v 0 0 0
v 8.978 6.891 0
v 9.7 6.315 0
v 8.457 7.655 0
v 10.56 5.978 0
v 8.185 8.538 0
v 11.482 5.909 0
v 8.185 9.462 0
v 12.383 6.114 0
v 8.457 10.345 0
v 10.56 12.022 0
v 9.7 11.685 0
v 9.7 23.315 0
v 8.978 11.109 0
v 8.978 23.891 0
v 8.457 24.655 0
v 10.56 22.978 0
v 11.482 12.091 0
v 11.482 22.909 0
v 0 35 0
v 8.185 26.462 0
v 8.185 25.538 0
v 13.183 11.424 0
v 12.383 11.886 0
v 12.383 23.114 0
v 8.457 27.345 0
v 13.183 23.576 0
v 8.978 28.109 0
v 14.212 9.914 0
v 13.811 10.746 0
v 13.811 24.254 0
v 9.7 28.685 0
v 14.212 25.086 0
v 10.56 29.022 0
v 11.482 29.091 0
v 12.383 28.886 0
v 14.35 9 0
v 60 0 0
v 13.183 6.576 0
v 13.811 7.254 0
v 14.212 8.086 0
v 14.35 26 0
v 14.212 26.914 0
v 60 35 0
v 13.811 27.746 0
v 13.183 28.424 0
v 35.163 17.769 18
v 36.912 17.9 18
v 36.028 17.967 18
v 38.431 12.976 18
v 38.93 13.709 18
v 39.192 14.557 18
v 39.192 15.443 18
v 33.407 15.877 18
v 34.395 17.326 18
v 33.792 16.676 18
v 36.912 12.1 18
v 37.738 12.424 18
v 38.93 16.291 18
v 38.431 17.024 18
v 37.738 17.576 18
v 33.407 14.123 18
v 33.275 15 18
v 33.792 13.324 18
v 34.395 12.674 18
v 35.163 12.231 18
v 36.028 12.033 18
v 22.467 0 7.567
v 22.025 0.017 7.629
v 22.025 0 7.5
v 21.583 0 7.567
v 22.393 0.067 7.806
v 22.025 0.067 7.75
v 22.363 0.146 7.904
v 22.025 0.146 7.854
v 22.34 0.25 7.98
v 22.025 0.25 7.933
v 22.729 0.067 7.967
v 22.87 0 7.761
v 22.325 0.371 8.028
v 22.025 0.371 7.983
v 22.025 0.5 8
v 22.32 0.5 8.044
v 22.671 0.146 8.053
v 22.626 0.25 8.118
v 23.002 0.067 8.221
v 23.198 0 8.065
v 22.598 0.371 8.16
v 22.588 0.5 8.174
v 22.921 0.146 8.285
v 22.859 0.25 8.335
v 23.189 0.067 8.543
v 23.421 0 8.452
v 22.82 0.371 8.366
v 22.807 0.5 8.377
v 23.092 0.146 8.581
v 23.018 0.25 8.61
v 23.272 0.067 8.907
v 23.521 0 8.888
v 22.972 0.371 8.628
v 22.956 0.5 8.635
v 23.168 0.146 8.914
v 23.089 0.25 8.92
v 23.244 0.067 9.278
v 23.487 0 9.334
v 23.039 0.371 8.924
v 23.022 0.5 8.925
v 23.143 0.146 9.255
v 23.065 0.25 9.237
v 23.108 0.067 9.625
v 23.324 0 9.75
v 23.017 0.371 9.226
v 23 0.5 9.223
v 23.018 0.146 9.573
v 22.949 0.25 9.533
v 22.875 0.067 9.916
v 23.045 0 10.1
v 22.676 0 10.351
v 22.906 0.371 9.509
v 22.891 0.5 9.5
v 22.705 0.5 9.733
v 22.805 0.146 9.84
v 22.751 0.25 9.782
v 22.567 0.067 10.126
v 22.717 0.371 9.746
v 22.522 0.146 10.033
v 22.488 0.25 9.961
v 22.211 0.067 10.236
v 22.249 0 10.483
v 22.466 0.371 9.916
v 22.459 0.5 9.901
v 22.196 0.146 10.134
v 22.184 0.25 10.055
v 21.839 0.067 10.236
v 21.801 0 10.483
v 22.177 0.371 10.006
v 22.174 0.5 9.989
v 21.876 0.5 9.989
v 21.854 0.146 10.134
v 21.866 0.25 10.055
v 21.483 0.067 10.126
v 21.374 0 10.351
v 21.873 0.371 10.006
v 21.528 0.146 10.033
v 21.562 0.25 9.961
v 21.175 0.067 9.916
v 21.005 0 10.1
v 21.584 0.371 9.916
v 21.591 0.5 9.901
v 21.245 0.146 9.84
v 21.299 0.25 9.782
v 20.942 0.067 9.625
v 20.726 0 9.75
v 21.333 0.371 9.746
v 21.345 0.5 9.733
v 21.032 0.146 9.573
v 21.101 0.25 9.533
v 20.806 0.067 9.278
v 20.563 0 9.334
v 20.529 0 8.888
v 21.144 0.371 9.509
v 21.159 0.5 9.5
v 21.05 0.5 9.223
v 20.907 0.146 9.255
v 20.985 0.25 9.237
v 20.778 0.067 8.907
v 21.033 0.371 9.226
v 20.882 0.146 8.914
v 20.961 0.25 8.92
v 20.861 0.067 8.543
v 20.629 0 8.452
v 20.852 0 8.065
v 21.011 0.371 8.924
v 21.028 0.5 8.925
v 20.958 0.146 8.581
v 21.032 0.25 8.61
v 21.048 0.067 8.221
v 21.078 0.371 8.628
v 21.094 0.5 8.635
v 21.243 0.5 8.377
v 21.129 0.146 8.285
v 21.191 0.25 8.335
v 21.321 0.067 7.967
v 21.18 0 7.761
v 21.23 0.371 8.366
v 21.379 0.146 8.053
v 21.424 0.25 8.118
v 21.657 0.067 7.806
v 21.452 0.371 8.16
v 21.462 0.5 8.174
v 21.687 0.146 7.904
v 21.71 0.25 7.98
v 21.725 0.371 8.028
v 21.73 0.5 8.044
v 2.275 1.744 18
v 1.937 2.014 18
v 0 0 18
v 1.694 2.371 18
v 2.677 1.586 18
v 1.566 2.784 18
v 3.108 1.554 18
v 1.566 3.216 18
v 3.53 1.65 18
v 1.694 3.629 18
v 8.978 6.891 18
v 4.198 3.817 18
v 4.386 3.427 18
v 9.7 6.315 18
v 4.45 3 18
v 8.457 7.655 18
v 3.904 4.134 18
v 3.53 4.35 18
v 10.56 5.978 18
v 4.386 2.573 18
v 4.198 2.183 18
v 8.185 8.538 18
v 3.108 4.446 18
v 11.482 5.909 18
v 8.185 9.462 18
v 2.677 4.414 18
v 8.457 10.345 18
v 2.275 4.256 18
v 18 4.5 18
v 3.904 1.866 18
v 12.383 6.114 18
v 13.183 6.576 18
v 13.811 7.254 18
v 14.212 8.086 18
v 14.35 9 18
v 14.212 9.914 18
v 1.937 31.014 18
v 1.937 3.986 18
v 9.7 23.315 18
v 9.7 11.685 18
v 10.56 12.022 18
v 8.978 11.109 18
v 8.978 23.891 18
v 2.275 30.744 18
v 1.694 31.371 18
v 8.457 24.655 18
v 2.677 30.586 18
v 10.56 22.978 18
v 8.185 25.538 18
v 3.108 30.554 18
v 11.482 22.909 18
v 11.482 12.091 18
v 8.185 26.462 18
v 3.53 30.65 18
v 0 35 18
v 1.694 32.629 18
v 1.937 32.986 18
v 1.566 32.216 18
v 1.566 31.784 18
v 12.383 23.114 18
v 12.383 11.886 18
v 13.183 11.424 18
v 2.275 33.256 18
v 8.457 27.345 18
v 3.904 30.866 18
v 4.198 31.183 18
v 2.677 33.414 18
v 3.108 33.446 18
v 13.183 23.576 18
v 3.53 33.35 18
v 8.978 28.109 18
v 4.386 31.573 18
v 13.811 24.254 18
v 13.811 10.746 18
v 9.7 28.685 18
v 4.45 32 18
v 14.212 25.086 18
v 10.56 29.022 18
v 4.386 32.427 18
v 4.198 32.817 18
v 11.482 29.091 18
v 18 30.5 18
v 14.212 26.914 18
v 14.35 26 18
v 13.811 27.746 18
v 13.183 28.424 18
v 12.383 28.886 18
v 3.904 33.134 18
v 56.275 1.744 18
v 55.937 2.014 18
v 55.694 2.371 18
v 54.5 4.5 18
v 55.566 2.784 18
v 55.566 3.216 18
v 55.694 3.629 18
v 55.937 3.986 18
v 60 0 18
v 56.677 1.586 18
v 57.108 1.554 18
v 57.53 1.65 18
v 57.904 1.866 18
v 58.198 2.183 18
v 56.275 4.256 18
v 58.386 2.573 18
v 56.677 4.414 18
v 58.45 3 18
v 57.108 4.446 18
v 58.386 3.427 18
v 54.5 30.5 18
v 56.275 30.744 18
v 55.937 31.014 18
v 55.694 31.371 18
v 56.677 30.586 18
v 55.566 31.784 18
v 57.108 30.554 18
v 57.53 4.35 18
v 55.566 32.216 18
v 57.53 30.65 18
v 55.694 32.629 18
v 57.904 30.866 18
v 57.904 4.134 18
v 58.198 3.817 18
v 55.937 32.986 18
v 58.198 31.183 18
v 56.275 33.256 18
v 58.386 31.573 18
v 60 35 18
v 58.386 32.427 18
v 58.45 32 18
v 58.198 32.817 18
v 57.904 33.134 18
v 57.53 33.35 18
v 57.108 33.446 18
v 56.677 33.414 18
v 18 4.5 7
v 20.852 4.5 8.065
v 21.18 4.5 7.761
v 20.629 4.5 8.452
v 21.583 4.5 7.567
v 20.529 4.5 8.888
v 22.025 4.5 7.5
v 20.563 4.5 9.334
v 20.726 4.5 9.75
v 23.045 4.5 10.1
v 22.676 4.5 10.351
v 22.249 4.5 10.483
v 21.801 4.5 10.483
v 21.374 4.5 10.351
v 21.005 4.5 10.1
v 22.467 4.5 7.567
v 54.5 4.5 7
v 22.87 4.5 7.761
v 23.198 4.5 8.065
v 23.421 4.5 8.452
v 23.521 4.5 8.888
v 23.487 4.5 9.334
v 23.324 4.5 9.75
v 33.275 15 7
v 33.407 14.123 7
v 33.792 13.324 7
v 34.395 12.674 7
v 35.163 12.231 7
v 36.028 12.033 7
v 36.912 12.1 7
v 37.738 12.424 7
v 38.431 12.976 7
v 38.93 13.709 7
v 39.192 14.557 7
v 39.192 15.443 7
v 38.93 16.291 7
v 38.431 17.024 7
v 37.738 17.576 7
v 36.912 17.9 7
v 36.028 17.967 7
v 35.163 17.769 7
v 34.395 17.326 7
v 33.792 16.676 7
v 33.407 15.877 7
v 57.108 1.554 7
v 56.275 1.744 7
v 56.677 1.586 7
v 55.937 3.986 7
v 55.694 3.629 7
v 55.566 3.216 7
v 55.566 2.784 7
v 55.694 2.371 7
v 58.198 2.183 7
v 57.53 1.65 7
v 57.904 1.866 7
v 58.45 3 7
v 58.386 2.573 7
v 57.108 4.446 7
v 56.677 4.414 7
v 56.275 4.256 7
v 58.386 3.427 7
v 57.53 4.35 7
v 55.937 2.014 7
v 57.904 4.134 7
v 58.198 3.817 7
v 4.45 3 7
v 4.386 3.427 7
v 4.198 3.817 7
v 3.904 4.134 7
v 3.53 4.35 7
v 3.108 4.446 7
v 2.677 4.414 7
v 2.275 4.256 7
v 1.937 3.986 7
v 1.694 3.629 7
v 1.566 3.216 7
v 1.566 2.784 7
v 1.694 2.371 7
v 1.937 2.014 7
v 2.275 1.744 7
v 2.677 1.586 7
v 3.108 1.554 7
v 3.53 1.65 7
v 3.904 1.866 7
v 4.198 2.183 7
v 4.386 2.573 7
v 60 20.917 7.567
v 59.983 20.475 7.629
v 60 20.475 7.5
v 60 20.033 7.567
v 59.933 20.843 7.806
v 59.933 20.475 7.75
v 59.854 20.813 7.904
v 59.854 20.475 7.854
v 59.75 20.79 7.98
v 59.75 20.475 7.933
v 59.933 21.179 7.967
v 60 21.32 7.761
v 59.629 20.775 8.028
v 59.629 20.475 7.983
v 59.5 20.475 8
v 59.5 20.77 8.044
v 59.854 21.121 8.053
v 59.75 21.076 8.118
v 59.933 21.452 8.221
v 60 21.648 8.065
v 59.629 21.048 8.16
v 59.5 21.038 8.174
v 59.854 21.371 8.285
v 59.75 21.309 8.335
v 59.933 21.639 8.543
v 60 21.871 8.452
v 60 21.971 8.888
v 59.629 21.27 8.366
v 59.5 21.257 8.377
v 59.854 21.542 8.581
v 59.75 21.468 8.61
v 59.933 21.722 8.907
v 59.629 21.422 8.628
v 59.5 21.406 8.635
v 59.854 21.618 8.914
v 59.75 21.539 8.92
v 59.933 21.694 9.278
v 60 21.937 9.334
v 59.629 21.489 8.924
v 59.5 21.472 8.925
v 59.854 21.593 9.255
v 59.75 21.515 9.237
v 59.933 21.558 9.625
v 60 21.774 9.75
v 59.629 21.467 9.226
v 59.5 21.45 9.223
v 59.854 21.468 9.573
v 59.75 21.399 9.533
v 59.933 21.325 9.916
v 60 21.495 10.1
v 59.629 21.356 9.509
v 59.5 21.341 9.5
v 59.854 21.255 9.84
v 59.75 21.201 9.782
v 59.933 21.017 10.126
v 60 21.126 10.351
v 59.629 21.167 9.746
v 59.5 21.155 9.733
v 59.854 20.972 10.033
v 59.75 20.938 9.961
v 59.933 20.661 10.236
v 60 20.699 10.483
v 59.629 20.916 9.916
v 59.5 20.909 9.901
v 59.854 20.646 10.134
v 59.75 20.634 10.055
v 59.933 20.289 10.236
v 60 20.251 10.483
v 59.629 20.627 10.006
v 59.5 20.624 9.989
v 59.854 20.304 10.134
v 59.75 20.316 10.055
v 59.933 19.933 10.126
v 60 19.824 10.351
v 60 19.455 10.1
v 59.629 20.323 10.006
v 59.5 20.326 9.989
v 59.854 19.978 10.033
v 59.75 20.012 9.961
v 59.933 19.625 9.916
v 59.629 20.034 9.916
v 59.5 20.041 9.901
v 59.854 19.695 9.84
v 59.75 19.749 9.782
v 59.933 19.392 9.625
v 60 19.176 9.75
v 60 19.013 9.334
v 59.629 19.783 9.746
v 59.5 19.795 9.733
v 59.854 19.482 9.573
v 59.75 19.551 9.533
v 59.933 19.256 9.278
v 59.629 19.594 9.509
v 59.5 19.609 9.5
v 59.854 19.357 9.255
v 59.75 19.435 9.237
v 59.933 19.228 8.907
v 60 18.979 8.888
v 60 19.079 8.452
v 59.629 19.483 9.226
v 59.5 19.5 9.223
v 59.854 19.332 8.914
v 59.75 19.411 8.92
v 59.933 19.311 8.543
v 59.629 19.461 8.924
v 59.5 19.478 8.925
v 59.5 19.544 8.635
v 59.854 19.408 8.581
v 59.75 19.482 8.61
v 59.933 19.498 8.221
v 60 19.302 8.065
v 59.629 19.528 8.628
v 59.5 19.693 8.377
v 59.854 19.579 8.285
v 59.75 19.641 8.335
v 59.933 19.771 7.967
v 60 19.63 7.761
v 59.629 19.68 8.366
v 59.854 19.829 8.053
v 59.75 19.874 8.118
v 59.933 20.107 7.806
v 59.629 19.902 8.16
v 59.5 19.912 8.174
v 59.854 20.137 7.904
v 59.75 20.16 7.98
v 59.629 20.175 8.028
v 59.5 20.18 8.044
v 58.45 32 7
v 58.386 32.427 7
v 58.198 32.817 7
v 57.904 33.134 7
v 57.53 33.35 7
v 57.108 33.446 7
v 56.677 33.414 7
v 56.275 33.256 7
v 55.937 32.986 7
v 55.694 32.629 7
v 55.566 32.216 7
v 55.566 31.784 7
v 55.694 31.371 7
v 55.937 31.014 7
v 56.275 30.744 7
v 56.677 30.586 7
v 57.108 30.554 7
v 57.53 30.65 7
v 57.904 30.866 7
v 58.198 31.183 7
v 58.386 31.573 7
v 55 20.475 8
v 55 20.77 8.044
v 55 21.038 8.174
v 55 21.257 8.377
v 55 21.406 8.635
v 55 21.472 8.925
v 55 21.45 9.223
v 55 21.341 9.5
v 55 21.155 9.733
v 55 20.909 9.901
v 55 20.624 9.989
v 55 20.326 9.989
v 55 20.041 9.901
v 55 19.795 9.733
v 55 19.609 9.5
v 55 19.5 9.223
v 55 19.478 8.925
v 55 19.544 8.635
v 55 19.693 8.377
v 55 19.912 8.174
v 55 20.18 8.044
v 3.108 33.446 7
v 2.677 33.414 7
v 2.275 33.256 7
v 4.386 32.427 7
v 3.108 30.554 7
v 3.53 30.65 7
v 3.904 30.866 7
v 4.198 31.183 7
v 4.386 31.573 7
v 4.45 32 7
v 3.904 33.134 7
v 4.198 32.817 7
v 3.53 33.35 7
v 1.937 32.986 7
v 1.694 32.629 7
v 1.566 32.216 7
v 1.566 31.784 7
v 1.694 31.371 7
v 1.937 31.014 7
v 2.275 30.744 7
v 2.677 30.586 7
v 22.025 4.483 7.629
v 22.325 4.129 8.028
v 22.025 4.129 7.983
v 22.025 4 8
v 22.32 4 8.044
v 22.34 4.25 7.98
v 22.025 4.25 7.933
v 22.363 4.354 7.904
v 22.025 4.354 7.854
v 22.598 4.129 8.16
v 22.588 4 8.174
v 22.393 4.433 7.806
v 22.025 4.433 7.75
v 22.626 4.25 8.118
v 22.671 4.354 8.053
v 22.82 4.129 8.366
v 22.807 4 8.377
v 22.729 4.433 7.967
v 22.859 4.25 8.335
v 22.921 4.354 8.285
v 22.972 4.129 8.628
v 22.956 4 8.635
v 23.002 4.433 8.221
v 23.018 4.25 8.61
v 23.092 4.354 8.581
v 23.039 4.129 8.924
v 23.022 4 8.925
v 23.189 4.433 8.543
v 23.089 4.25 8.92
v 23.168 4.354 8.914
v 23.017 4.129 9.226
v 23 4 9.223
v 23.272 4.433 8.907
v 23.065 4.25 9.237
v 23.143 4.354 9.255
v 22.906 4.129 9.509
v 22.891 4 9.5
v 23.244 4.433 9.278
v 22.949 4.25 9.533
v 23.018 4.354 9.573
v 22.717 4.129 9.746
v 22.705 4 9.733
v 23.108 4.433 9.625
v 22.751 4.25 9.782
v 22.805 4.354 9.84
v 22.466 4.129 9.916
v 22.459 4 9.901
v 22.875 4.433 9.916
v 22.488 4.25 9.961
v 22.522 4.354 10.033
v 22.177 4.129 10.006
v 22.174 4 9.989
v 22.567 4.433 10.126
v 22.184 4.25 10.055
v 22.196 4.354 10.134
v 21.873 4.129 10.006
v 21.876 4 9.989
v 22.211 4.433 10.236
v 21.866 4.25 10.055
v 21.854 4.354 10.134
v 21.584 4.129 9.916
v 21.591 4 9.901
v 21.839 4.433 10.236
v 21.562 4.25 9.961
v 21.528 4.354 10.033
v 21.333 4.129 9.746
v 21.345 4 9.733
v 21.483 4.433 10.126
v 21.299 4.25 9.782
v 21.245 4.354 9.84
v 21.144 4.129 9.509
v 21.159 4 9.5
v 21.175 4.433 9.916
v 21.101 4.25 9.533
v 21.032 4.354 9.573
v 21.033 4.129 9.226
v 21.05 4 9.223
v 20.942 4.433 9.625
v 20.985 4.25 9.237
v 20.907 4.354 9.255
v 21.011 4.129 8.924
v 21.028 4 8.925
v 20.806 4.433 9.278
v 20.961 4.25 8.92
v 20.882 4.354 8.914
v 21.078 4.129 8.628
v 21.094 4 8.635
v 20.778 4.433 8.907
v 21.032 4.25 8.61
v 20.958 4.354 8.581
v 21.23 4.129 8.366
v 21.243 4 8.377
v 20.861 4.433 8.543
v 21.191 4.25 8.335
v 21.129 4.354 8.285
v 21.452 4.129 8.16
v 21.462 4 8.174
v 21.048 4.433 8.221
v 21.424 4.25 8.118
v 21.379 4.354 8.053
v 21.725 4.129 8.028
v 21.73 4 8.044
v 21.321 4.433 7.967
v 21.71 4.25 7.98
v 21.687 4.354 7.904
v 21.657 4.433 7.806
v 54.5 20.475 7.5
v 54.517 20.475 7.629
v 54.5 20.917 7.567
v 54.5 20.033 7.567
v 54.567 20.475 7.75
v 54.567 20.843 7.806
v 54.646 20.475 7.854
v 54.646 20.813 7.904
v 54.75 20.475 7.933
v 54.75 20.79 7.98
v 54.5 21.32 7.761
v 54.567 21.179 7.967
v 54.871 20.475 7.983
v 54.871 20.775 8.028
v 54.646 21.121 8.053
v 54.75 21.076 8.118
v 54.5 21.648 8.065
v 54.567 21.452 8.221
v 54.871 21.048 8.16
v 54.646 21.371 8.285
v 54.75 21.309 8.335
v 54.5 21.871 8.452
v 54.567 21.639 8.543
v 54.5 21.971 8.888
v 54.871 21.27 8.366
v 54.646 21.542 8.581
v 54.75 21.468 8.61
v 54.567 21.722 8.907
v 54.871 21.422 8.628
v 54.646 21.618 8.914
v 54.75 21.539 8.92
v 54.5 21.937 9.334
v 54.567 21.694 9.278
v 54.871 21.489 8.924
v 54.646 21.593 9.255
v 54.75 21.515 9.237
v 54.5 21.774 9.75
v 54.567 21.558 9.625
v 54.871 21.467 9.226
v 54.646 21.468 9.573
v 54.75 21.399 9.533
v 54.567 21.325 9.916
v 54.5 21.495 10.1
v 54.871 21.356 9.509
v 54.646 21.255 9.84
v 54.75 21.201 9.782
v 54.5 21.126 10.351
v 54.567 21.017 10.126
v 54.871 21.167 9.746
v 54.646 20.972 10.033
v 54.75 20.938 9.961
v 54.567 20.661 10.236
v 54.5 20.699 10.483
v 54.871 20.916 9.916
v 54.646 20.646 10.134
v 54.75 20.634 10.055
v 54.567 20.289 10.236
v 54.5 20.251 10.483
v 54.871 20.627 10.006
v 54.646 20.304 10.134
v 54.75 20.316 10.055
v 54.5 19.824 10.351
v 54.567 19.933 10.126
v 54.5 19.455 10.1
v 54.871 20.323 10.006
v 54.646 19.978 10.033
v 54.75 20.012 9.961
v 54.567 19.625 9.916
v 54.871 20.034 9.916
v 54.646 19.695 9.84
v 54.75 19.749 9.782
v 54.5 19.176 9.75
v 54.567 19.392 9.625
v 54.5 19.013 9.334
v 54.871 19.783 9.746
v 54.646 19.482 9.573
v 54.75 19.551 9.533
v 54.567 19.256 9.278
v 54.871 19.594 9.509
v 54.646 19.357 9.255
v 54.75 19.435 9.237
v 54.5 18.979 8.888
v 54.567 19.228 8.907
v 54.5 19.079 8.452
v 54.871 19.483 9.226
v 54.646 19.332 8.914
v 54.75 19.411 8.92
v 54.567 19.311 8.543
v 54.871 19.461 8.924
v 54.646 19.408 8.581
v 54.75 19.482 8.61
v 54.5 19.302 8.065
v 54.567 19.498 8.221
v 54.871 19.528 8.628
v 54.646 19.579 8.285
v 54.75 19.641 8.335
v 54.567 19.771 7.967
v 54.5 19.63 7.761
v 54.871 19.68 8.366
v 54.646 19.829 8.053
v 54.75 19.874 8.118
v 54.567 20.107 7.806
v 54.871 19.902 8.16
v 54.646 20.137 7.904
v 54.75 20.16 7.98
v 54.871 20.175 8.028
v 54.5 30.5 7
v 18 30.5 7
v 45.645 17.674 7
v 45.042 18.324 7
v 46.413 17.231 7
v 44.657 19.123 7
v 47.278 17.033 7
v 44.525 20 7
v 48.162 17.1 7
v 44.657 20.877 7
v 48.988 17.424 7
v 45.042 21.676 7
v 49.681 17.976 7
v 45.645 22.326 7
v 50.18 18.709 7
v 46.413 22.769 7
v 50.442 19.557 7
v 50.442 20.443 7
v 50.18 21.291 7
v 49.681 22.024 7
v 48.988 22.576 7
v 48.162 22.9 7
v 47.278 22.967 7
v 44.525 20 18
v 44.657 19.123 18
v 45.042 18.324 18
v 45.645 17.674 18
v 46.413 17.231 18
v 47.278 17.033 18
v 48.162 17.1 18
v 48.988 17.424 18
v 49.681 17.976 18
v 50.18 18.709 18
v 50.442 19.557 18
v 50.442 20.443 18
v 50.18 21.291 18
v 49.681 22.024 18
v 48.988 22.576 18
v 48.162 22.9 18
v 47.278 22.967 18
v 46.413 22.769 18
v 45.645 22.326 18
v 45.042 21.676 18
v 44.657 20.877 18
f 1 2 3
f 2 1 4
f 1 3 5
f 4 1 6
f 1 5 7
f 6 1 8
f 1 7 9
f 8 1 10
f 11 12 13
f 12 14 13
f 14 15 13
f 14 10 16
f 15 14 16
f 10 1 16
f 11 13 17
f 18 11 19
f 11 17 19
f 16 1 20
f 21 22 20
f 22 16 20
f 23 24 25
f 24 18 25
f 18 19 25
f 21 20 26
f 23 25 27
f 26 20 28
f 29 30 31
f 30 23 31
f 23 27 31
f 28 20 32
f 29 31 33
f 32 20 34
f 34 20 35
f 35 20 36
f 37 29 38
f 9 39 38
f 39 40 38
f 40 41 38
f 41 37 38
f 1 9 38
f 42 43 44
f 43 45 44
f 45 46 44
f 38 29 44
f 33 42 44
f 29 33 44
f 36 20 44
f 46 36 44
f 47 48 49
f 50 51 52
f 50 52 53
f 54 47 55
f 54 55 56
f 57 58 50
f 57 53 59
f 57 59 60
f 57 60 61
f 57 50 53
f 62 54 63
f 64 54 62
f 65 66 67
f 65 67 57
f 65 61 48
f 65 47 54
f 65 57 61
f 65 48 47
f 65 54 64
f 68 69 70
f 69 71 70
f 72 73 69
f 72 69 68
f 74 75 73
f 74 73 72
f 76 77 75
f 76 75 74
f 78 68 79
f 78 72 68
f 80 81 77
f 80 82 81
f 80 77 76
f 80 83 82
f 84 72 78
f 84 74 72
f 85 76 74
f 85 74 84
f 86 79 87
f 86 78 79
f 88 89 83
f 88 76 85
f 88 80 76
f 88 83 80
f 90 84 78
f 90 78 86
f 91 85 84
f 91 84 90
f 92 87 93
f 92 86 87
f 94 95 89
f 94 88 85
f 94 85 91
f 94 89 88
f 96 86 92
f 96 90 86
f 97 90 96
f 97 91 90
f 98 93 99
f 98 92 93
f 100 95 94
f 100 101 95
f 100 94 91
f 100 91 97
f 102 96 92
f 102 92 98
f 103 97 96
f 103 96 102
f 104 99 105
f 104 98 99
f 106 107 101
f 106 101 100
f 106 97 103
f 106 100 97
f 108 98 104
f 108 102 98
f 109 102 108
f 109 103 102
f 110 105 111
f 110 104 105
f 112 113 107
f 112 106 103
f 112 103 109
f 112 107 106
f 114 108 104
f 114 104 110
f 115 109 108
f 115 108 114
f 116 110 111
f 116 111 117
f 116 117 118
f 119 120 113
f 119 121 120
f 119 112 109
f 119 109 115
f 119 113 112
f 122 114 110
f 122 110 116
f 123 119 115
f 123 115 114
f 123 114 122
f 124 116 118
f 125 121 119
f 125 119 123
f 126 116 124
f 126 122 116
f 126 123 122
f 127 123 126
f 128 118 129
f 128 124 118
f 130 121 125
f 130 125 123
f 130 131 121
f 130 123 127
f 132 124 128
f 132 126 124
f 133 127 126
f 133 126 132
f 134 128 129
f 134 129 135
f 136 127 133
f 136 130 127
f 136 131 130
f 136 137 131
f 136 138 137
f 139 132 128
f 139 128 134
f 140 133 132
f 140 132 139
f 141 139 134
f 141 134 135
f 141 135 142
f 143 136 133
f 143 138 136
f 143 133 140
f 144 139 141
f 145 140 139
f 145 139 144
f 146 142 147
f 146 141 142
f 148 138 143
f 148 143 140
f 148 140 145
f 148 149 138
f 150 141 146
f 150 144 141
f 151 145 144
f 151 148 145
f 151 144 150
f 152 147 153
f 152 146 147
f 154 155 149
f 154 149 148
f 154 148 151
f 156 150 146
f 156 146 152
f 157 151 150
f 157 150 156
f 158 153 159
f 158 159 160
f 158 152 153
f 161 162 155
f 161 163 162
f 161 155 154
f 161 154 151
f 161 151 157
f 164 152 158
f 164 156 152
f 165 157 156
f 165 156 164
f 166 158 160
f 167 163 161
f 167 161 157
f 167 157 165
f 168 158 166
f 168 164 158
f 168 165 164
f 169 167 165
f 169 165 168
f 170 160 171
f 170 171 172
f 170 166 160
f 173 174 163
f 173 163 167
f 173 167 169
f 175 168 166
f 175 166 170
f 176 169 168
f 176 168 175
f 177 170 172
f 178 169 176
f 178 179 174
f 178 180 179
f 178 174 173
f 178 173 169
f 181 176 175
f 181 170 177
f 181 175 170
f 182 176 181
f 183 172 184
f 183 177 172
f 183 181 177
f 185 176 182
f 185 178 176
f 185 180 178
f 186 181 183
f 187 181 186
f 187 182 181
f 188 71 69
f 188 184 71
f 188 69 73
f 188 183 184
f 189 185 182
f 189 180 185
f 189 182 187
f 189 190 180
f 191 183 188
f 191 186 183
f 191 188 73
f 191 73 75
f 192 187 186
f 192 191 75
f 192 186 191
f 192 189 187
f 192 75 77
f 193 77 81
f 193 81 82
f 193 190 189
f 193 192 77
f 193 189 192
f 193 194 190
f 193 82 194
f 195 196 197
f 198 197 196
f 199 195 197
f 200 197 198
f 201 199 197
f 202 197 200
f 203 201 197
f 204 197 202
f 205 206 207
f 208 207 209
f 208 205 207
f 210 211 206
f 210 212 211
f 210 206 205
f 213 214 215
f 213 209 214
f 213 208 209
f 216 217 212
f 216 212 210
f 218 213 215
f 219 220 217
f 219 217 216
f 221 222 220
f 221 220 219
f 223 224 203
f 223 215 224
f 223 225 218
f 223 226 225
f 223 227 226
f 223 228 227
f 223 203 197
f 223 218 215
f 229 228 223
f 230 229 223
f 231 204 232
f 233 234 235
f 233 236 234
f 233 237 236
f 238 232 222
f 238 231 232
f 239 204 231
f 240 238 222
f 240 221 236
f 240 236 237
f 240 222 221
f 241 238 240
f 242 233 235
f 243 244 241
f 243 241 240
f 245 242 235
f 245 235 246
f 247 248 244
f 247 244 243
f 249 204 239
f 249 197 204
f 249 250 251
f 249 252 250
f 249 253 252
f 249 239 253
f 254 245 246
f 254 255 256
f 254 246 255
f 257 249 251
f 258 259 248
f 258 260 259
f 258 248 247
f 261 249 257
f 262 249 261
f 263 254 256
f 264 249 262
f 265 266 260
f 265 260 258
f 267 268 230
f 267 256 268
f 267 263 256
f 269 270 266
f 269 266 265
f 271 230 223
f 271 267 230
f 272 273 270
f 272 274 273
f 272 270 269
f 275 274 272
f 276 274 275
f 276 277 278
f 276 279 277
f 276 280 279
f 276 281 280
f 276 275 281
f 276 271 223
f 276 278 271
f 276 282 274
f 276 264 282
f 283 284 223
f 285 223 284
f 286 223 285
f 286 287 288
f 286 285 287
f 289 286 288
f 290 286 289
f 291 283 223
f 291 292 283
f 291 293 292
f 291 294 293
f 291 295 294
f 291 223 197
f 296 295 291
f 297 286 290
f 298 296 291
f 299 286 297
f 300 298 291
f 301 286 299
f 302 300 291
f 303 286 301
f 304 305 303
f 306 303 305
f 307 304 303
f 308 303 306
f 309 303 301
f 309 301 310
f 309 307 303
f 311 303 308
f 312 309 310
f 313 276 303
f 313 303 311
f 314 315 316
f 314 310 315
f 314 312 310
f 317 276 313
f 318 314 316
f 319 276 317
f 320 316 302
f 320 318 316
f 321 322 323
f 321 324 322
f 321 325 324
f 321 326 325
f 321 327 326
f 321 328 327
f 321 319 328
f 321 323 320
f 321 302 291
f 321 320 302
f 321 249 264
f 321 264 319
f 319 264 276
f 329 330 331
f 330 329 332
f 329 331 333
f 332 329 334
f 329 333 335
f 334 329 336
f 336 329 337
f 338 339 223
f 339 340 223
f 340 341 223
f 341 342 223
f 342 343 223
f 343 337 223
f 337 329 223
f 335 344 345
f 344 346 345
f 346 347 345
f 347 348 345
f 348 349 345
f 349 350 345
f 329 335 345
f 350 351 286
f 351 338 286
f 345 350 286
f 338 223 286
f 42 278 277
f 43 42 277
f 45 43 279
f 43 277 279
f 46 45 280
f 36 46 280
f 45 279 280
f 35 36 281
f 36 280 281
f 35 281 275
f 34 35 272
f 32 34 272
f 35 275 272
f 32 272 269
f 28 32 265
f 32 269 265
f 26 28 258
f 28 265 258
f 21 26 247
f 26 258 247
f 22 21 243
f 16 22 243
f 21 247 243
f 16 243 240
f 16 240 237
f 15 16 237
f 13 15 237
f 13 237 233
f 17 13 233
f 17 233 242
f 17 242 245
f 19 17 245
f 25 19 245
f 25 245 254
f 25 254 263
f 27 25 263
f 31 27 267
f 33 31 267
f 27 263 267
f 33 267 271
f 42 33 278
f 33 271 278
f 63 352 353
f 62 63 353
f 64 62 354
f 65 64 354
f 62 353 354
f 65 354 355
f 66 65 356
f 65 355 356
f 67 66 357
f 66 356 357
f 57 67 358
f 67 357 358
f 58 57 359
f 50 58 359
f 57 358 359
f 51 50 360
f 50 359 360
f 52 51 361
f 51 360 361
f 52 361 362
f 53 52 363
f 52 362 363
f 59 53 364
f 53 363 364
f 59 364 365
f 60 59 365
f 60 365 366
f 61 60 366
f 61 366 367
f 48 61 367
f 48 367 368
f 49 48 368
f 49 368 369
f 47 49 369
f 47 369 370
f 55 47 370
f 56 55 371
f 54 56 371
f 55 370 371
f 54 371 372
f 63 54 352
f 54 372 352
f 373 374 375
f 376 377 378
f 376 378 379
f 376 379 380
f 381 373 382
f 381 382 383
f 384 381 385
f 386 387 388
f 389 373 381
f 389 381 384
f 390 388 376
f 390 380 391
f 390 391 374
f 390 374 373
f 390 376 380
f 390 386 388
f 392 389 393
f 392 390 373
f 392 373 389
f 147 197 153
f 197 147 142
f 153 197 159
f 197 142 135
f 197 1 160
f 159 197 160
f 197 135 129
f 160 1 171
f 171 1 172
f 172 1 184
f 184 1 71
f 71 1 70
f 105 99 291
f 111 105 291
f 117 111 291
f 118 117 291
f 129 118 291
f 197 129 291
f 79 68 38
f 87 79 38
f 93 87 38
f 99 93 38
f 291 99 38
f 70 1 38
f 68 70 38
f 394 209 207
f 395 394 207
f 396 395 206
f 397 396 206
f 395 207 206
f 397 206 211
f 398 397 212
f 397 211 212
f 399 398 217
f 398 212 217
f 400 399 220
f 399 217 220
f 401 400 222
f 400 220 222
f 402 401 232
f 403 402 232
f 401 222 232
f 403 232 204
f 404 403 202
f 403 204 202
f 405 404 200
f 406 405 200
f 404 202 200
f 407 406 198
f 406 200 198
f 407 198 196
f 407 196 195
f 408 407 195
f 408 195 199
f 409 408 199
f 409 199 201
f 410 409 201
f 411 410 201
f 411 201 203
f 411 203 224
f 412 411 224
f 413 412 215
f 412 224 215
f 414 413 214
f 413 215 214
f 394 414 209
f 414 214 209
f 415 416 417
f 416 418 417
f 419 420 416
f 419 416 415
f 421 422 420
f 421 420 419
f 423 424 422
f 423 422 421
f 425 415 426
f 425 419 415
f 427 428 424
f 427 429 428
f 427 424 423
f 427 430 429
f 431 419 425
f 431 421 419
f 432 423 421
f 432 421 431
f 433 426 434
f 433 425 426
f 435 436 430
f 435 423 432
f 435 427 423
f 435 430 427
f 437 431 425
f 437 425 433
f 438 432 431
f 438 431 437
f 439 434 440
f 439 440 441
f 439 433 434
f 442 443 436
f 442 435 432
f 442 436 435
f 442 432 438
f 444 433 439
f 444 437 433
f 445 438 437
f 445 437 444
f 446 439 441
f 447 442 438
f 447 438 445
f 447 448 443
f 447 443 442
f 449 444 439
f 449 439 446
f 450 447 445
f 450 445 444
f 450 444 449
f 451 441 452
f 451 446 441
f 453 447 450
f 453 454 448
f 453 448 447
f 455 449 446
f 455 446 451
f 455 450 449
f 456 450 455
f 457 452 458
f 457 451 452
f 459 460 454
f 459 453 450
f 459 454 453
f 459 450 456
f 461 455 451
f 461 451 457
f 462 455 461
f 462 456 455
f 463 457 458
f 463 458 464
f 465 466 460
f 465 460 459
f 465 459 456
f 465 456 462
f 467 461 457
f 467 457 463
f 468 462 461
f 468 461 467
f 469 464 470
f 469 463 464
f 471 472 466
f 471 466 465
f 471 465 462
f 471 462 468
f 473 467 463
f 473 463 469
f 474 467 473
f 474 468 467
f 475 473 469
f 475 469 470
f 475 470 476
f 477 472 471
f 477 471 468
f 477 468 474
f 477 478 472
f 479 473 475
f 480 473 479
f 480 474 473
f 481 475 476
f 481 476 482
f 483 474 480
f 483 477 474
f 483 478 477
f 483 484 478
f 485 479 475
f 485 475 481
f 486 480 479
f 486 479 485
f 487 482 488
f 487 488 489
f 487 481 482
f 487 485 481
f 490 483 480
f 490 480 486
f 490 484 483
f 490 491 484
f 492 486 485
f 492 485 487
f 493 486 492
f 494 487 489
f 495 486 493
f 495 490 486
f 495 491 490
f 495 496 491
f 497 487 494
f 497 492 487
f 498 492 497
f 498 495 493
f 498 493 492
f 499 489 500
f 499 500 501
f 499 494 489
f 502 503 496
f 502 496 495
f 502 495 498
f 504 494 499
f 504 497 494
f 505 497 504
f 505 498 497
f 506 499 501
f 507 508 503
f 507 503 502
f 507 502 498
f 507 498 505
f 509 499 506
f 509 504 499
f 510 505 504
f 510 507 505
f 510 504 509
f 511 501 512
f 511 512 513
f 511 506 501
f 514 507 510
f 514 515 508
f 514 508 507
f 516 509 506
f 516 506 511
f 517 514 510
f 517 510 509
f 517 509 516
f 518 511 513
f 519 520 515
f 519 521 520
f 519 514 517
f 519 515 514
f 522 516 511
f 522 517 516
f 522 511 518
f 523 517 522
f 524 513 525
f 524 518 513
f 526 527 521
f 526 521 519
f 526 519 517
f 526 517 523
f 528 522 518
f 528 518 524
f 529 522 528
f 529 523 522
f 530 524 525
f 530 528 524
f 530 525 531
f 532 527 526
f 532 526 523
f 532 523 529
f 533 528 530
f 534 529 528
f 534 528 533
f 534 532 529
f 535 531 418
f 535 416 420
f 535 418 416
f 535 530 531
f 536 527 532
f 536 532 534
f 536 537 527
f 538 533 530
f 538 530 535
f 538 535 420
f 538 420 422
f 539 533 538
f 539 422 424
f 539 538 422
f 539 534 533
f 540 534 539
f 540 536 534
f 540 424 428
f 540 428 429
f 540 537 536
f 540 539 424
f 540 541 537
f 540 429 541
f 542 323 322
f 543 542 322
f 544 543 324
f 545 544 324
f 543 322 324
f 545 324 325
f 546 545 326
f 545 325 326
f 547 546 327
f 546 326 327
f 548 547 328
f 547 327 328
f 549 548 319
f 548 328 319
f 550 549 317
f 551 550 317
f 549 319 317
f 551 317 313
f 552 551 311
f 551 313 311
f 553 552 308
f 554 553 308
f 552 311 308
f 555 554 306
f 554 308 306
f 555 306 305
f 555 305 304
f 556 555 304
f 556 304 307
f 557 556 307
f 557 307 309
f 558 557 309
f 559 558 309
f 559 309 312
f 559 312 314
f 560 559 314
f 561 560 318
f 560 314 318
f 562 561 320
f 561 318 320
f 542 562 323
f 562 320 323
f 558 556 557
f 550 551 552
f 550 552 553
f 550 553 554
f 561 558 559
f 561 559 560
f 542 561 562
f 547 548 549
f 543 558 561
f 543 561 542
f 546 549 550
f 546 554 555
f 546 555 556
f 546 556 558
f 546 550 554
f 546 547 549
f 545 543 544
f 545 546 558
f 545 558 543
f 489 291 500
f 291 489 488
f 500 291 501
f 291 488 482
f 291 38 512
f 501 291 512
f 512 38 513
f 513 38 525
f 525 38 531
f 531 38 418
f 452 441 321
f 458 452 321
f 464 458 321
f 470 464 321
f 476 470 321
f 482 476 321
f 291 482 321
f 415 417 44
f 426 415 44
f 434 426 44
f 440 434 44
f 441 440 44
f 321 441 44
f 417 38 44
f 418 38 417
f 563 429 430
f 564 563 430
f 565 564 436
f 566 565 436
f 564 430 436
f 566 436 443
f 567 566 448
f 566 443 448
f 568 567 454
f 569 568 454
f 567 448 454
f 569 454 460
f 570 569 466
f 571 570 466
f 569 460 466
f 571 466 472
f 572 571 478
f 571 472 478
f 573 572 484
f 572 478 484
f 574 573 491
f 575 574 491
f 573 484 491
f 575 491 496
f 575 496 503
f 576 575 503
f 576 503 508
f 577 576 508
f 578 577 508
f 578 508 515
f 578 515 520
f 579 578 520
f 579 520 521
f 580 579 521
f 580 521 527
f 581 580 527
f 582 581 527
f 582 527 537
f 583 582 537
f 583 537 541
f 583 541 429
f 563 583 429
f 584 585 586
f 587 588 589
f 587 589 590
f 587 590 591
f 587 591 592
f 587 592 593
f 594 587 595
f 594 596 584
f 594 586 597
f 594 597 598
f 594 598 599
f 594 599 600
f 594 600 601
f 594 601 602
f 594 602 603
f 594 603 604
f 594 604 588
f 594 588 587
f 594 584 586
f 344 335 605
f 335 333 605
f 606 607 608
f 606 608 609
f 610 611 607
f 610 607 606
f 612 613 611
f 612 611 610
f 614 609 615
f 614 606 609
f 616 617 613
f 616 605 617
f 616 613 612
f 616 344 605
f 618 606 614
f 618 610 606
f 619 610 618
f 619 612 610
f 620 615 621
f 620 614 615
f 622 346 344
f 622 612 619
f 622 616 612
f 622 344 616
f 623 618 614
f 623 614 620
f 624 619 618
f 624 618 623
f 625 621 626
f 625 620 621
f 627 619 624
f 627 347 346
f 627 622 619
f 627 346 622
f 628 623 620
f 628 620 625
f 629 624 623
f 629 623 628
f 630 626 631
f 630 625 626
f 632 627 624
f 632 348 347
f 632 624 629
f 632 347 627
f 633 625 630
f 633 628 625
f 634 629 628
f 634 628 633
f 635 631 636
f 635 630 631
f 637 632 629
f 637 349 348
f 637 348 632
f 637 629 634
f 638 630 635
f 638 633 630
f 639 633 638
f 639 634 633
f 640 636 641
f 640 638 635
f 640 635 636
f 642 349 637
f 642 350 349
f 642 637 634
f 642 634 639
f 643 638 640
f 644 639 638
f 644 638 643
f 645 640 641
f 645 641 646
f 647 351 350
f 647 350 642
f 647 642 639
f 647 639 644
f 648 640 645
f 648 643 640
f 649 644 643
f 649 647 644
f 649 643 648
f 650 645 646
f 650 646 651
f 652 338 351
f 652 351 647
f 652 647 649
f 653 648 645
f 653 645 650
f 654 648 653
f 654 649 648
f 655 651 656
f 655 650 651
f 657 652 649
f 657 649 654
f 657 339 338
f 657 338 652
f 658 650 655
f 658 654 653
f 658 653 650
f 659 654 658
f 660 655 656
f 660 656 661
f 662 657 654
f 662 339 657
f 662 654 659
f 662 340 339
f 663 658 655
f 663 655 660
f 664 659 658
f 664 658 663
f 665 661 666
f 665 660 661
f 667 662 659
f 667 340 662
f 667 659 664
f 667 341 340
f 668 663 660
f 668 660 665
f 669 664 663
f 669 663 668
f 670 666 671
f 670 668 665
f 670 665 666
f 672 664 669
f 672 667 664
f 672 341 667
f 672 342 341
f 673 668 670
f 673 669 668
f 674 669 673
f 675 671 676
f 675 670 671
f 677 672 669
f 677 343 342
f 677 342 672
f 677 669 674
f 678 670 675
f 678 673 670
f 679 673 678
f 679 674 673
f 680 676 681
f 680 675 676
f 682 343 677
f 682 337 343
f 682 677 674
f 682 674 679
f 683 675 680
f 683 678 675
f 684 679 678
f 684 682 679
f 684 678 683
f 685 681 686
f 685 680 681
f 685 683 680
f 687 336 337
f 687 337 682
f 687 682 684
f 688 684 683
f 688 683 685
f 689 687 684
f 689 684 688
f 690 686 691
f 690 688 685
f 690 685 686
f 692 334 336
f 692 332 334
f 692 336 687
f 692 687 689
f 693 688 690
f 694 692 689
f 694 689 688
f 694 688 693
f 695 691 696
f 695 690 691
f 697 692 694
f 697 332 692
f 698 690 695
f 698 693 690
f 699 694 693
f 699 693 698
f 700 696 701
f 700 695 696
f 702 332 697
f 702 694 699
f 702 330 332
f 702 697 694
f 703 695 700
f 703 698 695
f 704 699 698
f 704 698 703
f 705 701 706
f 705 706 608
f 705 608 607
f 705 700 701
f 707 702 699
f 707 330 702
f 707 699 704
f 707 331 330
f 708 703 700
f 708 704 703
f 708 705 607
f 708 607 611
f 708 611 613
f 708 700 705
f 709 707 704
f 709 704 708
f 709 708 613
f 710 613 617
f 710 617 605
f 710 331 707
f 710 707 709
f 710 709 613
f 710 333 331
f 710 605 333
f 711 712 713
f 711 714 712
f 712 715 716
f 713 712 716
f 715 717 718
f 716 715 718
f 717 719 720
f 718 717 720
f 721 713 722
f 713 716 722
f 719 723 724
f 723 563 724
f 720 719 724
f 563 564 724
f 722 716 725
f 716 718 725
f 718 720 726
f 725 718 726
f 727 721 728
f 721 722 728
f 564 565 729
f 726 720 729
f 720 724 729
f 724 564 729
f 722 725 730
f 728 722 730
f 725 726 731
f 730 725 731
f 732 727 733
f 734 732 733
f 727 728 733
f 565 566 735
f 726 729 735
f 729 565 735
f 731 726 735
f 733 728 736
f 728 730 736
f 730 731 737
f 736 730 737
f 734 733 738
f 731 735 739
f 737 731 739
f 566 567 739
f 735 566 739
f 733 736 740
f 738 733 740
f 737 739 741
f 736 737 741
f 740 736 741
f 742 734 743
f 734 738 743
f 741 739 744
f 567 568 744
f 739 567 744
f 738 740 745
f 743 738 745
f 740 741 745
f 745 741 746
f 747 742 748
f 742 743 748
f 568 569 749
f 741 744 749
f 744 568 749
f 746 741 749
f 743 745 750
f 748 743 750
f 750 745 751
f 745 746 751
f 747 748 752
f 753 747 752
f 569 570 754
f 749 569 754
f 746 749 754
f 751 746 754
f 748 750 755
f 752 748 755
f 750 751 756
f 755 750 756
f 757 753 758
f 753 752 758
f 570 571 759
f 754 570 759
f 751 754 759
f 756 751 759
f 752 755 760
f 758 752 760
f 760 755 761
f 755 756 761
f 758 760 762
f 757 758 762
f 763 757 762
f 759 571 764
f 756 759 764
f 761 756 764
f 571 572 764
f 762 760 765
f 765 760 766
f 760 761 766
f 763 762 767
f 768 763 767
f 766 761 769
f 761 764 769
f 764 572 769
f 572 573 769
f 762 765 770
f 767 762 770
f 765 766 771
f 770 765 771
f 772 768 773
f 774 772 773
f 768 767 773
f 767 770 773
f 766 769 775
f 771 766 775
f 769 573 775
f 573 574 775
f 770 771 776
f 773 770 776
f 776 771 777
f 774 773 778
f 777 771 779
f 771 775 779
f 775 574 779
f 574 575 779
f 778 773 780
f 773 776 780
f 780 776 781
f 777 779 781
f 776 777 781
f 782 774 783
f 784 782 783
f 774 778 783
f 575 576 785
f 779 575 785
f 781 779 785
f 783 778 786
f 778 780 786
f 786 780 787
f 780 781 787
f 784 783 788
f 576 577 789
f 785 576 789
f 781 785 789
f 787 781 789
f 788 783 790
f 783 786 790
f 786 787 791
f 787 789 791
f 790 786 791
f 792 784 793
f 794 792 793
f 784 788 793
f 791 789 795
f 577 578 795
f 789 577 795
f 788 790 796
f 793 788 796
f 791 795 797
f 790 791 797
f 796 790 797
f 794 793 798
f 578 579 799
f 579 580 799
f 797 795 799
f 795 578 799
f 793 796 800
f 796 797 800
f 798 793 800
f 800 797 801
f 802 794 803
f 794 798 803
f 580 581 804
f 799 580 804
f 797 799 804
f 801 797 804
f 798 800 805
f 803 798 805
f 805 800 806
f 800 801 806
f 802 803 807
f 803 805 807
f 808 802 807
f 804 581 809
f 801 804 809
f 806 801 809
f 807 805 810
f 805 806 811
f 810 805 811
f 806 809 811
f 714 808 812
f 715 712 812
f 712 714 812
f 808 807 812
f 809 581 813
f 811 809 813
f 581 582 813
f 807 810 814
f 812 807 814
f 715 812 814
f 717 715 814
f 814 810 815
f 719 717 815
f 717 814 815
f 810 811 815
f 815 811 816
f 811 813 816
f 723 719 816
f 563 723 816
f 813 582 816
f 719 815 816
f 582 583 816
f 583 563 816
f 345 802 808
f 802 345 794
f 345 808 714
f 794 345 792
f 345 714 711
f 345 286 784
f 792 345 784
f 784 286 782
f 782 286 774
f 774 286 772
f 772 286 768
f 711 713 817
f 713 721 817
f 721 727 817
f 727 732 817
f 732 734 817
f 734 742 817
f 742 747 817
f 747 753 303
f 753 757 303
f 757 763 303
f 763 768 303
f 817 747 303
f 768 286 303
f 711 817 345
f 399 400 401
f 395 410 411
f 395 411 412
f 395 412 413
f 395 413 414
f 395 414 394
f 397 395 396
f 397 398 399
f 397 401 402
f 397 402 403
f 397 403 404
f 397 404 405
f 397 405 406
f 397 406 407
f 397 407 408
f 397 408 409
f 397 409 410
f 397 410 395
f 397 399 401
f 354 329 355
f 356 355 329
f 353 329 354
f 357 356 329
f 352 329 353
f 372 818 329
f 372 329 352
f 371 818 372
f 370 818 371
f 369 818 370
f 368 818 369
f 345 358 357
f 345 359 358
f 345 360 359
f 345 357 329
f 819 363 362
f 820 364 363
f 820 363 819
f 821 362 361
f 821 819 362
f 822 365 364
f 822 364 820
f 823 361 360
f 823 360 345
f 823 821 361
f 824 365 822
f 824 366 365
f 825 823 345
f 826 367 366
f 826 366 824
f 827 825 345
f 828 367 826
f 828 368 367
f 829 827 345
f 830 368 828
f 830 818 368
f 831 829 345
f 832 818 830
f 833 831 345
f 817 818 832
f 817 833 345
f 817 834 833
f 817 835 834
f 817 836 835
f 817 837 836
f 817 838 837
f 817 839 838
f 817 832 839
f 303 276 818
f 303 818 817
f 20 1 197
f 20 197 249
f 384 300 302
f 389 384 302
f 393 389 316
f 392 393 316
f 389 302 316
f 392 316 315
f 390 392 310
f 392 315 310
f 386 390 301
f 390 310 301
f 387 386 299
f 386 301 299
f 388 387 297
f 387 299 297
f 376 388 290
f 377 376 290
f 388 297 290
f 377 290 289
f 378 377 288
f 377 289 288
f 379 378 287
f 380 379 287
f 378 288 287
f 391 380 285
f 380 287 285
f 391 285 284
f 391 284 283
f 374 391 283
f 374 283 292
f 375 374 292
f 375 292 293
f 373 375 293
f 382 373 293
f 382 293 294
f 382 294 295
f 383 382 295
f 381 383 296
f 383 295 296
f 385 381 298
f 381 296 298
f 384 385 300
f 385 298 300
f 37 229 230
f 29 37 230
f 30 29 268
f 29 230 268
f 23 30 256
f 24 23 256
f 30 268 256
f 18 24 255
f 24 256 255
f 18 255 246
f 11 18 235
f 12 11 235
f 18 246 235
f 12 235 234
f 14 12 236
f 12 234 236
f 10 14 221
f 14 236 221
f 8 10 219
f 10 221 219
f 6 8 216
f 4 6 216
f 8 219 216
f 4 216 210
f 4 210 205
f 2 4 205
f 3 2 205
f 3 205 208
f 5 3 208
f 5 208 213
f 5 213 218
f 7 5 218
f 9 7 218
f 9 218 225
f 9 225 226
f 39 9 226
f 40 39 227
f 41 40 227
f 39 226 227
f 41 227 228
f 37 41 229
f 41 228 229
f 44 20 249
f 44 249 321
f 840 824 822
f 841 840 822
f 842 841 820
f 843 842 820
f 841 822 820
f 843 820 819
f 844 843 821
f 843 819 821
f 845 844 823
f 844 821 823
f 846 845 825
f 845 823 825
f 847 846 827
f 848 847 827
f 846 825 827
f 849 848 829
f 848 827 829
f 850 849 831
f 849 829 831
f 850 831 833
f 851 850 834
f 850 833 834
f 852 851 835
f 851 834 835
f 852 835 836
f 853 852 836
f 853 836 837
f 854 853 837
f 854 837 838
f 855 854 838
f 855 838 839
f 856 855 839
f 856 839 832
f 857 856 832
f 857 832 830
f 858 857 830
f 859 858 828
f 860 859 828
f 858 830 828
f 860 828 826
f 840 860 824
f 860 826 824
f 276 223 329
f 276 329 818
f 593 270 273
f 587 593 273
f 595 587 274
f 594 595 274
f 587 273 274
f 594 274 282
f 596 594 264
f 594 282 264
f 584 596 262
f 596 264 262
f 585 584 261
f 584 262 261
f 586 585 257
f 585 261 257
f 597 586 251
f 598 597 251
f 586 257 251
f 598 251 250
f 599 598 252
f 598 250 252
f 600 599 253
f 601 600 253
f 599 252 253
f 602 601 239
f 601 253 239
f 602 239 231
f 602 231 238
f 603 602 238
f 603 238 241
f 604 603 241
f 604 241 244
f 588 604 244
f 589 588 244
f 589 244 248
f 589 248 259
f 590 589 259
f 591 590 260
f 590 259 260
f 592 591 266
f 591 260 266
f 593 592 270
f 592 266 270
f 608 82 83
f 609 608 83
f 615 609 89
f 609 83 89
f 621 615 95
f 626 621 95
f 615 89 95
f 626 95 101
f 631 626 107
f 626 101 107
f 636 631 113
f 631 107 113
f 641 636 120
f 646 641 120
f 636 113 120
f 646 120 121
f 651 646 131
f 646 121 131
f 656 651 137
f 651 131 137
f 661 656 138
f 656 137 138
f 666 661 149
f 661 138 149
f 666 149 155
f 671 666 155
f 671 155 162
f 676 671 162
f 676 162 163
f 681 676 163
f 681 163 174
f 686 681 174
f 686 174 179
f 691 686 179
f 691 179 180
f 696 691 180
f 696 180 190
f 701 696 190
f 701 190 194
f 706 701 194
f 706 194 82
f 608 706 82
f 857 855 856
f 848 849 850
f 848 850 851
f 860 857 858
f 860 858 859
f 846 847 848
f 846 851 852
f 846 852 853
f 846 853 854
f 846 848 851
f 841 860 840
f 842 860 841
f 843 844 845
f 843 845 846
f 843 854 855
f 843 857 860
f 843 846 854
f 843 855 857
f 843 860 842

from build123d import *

# Parameters (mm, degrees)
SKETCH1_W           = 60
SKETCH1_H           = 35
BOSS_EXTRUDE1_DEPTH = 18
SKETCH2_R           = 3.1
CUT_EXTRUDE1_DEPTH  = 18
SKETCH3_R           = 1.45
SKETCH3_W           = 36.5
SKETCH3_H           = 26
CUT_EXTRUDE2_DEPTH  = 11
SKETCH4_R           = 2.975
BOSS_EXTRUDE2_DEPTH = 11
SKETCH6_R           = 1
CUT_EXTRUDE3_DEPTH  = 5.8
SKETCH8_R           = 1
CUT_EXTRUDE4_DEPTH  = 5.8
FILLET2_R           = 0.5


with BuildPart() as part:
    # Sketch1 → Boss-Extrude1 (new body)
    with BuildSketch(Plane.XY):
        with Locations((30, 17.5)):
            Rectangle(SKETCH1_W, SKETCH1_H)
    extrude(amount=BOSS_EXTRUDE1_DEPTH)

    # Sketch2 → Cut-Extrude1 (cut)
    with BuildSketch(Plane.XY.offset(18)):
        with Locations((11.25, 26)):
            Circle(SKETCH2_R)
        with Locations((11.25, 9)):
            Circle(SKETCH2_R)
    extrude(amount=-CUT_EXTRUDE1_DEPTH, mode=Mode.SUBTRACT)

    # Sketch3 → Cut-Extrude2 (cut)
    with BuildSketch(Plane.XY.offset(18)):
        with Locations((3, 32)):
            Circle(SKETCH3_R)
        with Locations((57, 32)):
            Circle(SKETCH3_R)
        with Locations((57, 3)):
            Circle(SKETCH3_R)
        with Locations((3, 3)):
            Circle(SKETCH3_R)
        with Locations((36.25, 17.5)):
            Rectangle(SKETCH3_W, SKETCH3_H)
    extrude(amount=-CUT_EXTRUDE2_DEPTH, mode=Mode.SUBTRACT)

    # Sketch4 → Boss-Extrude2 (add)
    with BuildSketch(Plane.XY.offset(7)):
        with Locations(Location((36.25, 15, 0), (0, 0, 180))):
            Circle(SKETCH4_R)
        with Locations(Location((47.5, 20, 0), (0, 0, 180))):
            Circle(SKETCH4_R)
    extrude(amount=BOSS_EXTRUDE2_DEPTH)

    # Sketch6 → Cut-Extrude3 (cut)
    with BuildSketch(Plane(origin=(60, 0, 0), x_dir=(0, 0, -1), z_dir=(1, 0, 0))):
        with Locations((-9, 20.475)):
            Circle(SKETCH6_R)
    extrude(amount=-CUT_EXTRUDE3_DEPTH, mode=Mode.SUBTRACT)

    # Sketch8 → Cut-Extrude4 (cut)
    with BuildSketch(Plane.XZ):
        with Locations(Location((22.025, 9, 0), (0, 0, 270))):
            Circle(SKETCH8_R)
    extrude(amount=-CUT_EXTRUDE4_DEPTH, mode=Mode.SUBTRACT)

    # Fillet2
    fillet2_edges = [part.edges().sort_by_distance(p)[0] for p in [
        (54.5, 20.475, 10),
        (60, 20.475, 10),
        (22.025, 4.5, 10),
        (22.025, 0, 10),
    ]]
    fillet(fillet2_edges, radius=FILLET2_R)


solid = part.part
